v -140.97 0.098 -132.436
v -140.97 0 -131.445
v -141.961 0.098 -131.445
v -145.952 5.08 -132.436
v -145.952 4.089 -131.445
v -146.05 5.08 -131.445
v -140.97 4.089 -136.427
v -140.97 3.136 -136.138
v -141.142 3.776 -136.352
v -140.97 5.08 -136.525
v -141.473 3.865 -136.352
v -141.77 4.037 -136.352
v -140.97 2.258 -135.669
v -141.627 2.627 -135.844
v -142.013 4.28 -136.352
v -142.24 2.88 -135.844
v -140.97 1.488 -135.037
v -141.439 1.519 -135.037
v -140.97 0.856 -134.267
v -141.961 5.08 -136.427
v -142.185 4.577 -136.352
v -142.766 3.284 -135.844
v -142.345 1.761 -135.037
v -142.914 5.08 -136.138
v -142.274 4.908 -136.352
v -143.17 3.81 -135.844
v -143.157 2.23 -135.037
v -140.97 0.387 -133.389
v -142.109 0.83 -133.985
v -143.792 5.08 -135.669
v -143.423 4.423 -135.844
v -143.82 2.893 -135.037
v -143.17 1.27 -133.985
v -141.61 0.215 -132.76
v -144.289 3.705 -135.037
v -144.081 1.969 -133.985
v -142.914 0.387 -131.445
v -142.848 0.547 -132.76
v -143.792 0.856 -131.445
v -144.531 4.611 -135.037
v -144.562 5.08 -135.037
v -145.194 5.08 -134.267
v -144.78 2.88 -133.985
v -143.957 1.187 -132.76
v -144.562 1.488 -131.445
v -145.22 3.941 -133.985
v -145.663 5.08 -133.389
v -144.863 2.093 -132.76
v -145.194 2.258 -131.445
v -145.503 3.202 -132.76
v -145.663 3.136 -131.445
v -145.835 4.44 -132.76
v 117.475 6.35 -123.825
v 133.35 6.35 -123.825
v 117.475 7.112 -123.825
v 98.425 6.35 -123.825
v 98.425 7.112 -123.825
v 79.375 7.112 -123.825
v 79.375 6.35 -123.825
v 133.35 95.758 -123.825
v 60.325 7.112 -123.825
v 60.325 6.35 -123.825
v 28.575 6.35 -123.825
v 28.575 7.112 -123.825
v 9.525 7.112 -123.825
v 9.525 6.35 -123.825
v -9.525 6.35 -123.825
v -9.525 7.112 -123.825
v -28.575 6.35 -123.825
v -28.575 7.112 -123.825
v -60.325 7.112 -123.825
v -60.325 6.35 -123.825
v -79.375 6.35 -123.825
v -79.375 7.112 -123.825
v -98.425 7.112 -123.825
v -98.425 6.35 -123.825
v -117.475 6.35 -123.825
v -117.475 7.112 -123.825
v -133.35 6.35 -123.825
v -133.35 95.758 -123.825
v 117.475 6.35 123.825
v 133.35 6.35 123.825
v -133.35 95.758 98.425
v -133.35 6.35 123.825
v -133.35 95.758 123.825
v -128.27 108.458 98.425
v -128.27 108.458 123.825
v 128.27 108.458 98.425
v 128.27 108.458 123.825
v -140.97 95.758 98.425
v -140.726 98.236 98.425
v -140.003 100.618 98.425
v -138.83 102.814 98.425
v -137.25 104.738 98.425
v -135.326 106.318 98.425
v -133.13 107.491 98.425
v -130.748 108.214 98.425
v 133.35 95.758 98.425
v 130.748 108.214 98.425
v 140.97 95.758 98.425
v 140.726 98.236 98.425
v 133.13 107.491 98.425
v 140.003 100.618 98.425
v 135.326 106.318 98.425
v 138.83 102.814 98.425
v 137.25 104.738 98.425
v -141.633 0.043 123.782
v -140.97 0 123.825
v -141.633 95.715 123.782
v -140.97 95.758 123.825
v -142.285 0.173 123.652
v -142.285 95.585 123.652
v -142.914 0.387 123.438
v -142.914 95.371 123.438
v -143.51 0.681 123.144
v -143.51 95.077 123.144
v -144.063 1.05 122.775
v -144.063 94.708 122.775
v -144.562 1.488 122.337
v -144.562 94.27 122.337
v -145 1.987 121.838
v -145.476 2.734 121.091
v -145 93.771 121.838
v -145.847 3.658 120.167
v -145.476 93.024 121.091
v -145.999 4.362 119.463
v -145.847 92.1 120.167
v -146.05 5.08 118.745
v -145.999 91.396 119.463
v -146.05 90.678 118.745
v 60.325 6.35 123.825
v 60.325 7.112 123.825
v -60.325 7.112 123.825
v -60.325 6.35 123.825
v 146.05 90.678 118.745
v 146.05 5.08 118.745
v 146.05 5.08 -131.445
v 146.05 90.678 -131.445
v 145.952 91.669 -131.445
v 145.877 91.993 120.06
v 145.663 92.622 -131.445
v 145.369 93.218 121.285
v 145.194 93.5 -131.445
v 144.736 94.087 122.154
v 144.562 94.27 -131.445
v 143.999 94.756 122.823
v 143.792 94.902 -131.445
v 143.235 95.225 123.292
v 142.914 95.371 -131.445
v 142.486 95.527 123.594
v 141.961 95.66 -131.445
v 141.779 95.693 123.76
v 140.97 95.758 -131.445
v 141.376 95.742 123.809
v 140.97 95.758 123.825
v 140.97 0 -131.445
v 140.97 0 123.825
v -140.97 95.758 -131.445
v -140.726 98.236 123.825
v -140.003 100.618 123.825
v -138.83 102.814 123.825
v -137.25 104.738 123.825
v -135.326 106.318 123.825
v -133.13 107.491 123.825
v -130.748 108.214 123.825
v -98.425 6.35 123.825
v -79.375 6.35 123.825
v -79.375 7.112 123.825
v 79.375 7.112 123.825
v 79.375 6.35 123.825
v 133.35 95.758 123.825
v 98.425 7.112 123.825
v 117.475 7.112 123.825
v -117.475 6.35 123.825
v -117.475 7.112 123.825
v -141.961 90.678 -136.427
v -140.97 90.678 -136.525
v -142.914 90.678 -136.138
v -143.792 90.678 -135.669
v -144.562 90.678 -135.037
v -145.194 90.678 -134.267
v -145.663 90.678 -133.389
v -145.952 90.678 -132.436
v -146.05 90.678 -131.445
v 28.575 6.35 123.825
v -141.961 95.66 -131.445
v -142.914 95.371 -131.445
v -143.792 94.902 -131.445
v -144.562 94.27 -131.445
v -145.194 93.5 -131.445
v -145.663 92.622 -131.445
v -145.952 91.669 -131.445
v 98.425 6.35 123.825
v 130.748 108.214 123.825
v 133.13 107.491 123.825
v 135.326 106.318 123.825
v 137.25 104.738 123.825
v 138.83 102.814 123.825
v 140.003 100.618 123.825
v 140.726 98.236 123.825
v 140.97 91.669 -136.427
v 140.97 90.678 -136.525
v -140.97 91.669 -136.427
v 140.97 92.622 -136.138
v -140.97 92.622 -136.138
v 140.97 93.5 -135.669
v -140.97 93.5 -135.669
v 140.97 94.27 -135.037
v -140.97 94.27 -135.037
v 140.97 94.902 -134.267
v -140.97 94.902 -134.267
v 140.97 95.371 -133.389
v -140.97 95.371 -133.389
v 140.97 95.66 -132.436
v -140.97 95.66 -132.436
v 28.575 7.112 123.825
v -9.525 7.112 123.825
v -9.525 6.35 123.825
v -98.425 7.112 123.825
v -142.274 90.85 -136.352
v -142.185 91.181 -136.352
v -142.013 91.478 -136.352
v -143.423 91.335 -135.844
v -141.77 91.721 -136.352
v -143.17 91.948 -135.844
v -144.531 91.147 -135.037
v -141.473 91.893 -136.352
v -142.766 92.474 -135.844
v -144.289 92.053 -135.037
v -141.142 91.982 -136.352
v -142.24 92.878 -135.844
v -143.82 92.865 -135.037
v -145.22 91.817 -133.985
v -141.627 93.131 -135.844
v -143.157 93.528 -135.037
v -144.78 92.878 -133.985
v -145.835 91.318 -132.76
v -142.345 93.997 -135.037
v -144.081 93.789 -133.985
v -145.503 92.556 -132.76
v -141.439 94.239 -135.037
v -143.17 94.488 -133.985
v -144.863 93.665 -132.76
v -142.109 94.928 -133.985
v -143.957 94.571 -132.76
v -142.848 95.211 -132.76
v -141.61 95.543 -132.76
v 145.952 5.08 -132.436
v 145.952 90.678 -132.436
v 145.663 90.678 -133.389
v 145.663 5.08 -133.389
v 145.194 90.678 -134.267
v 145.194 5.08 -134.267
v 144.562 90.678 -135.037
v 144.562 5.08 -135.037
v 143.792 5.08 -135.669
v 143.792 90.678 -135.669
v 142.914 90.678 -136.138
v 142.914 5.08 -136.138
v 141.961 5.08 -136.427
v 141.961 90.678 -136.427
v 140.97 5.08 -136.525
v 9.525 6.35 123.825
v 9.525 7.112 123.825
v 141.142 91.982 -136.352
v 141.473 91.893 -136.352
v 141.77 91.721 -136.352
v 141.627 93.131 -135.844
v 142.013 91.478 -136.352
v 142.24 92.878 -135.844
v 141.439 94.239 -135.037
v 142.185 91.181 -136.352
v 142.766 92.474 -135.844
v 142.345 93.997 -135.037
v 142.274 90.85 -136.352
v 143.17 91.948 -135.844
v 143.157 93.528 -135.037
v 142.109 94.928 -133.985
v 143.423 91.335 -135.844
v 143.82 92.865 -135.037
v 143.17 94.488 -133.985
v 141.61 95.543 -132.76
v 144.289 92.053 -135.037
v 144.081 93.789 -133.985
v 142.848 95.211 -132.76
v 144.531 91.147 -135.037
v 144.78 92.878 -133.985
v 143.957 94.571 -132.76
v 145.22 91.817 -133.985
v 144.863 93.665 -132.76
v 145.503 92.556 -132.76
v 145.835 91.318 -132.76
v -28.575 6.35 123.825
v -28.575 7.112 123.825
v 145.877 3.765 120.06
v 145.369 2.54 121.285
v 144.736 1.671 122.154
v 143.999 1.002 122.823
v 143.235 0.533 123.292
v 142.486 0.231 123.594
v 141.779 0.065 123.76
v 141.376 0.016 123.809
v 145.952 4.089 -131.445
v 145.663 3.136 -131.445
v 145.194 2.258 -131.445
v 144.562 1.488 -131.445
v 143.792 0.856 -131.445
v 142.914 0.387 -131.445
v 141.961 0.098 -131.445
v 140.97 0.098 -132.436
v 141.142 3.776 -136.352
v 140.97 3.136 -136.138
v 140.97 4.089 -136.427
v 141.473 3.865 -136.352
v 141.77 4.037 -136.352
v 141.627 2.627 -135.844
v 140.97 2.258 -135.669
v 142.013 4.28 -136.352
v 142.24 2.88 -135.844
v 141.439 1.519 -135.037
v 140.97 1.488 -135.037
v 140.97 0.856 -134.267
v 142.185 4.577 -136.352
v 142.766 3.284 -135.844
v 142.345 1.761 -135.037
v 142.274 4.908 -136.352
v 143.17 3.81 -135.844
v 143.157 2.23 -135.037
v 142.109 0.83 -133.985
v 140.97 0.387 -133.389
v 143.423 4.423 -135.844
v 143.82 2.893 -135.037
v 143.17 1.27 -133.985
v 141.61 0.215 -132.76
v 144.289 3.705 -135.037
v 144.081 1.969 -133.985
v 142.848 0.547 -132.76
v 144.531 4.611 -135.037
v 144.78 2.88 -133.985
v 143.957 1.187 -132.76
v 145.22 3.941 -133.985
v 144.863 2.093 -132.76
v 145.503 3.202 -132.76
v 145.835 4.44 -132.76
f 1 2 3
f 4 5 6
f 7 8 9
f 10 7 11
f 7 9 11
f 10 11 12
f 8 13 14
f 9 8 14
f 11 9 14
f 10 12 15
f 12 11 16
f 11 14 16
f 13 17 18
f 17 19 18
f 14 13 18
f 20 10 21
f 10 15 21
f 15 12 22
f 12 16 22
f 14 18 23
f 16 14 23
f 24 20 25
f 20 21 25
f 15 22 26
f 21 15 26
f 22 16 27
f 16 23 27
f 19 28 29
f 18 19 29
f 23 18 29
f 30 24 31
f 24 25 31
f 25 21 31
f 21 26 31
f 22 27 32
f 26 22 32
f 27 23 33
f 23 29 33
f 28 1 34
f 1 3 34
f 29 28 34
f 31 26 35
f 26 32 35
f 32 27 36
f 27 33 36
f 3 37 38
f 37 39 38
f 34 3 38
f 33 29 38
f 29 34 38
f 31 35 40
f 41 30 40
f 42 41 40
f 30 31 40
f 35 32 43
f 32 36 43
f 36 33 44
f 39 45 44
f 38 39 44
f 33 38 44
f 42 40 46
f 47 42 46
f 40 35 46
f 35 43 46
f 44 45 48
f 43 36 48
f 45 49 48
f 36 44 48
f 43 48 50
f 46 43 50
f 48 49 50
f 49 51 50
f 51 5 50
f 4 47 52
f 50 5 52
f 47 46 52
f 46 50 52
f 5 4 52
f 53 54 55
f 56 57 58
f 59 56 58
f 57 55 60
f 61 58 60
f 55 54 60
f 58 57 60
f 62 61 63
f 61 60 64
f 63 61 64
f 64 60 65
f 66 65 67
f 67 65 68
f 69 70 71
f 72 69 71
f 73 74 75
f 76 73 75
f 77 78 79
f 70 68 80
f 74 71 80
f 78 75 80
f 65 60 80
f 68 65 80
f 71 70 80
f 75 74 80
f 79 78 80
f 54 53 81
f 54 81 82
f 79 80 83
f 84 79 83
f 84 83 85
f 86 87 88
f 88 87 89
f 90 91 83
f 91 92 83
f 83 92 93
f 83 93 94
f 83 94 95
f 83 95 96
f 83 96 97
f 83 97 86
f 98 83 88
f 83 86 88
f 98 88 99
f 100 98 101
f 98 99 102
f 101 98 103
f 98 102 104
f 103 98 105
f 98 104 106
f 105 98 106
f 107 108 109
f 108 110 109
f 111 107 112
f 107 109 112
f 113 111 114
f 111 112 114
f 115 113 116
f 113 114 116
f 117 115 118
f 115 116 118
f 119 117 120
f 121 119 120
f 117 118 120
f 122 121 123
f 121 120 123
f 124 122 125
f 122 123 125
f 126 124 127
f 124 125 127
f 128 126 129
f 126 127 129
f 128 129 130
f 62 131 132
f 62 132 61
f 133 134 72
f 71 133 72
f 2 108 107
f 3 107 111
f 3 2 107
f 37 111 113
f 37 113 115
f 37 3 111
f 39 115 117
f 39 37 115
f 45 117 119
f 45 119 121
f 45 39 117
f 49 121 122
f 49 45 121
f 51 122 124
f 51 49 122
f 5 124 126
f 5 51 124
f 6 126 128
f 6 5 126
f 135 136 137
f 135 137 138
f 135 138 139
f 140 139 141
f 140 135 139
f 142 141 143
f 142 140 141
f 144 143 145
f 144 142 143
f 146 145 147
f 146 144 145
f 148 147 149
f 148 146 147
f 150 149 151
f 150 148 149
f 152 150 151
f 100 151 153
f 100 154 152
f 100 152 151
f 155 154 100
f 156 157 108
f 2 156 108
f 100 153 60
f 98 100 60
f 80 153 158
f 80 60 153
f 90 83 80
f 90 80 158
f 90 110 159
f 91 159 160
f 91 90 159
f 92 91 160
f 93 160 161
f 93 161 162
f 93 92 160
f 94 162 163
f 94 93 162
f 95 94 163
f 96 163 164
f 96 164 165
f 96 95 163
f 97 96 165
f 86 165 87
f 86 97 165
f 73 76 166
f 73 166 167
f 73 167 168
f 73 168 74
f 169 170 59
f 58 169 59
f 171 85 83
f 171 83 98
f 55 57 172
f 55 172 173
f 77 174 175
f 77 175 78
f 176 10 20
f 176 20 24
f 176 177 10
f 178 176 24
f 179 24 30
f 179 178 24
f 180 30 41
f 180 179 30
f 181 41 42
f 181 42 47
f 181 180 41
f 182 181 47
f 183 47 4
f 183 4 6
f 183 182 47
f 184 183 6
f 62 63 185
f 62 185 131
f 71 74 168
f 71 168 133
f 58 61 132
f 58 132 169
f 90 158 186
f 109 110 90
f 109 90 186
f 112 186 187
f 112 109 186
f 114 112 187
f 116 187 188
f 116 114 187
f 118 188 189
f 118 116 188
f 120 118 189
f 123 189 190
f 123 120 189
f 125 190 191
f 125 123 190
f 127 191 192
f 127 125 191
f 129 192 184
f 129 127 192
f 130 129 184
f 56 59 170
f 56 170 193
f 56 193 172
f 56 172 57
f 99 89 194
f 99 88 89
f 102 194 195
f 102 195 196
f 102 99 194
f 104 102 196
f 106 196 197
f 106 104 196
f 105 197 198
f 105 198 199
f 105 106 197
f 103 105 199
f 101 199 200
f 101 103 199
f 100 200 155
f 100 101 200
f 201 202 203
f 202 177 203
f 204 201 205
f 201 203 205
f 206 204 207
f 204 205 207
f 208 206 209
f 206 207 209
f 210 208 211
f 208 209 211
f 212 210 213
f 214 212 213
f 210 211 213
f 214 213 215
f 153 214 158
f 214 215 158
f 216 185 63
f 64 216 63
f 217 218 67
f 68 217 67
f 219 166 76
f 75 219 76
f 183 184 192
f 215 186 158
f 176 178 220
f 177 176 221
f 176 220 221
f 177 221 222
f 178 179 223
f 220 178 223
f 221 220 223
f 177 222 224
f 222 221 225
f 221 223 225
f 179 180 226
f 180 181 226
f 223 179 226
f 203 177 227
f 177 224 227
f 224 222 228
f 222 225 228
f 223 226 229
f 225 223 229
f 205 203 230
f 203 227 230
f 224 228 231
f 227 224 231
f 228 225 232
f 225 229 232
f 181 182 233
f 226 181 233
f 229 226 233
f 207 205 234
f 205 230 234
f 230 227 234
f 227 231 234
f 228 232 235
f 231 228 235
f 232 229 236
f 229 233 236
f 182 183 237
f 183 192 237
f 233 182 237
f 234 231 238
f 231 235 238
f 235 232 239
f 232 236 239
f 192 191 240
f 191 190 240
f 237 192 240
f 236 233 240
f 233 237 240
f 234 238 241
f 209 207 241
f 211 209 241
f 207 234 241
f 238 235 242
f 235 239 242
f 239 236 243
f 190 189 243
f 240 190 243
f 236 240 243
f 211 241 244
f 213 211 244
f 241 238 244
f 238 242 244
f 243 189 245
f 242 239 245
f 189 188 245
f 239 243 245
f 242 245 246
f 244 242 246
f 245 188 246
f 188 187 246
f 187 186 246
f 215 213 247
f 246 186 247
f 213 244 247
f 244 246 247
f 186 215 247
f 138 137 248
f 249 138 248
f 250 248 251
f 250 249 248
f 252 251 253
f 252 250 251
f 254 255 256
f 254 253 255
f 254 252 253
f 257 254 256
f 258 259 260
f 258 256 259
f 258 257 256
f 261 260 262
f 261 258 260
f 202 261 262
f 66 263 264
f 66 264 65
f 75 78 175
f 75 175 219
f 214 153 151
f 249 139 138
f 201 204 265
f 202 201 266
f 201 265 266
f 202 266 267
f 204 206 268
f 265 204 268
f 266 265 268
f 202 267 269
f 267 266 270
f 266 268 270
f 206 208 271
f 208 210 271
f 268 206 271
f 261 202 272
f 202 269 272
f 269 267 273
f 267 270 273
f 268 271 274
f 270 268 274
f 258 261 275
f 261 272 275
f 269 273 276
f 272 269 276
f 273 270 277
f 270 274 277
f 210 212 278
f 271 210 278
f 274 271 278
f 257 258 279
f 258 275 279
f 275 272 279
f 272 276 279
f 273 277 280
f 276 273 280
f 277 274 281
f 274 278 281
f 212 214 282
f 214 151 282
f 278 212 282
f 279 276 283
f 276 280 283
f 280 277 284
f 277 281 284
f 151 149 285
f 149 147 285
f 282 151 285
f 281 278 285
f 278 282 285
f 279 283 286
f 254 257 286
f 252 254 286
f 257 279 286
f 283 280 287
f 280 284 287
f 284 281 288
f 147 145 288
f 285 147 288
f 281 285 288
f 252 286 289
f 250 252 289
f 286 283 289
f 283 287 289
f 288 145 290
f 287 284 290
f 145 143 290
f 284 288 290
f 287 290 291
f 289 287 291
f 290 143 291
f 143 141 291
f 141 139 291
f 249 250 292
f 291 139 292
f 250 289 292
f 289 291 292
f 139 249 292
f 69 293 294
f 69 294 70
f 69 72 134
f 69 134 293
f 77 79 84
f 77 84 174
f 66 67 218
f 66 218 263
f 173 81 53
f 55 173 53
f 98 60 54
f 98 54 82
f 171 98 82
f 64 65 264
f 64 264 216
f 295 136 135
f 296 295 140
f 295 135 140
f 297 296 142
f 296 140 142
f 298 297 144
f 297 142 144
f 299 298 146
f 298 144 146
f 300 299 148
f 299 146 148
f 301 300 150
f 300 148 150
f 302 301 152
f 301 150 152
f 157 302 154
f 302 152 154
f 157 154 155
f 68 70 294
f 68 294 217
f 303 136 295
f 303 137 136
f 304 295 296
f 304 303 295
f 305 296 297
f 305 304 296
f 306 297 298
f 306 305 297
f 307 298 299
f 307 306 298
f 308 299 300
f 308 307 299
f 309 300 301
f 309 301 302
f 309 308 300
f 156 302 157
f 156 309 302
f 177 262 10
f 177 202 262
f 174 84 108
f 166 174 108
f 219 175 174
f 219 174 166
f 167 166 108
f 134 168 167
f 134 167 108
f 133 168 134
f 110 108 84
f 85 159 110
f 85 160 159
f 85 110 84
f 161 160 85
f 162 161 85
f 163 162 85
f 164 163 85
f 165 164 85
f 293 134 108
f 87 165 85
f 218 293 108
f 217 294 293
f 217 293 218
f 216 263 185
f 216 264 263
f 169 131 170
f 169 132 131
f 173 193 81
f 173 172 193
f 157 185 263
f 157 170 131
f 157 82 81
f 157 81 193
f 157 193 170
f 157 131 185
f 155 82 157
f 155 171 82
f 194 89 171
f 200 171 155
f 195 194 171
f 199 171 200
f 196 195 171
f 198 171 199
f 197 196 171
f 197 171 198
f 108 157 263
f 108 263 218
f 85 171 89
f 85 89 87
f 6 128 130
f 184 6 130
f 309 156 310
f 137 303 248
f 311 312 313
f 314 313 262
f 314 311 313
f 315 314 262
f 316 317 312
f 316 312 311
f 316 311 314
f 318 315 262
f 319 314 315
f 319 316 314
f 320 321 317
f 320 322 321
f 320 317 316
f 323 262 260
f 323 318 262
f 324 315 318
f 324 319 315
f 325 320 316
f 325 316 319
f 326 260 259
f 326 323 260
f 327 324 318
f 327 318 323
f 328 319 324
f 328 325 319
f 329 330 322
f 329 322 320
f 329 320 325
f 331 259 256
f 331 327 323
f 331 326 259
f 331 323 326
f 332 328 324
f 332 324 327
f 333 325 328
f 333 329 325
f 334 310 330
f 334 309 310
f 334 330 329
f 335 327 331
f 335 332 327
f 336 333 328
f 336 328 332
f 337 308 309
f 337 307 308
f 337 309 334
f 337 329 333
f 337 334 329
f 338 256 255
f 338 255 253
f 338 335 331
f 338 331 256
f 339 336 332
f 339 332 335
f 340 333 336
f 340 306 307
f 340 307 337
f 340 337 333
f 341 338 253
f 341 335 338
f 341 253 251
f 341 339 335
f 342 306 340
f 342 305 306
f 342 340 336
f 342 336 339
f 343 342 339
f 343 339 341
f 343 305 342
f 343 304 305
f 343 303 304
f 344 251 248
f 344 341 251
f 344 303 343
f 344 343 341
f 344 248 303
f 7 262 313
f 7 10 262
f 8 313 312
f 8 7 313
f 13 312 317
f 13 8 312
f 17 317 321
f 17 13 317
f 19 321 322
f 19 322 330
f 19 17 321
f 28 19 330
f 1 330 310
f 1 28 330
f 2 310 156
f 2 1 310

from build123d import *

# Parameters (mm, degrees)
SKETCH1_W           = 266.7
SKETCH1_H           = 247.65
BOSS_EXTRUDE1_DEPTH = 6.35
SKETCH2_W           = 247.65
SKETCH2_H           = 95.758
BOSS_EXTRUDE2_DEPTH = 12.7
SKETCH3_W           = 292.1
SKETCH3_H           = 95.758
BOSS_EXTRUDE3_DEPTH = 12.7
SKETCH4_W           = 19.05
SKETCH4_H           = 247.65
BOSS_EXTRUDE4_DEPTH = 0.762
FILLET1_R           = 5.08
SKETCH6_W           = 281.94
SKETCH6_H           = 12.7
BOSS_EXTRUDE5_DEPTH = 25.4
FILLET2_R           = 12.7


with BuildPart() as part:
    # Sketch1 → Boss-Extrude1 (new body)
    with BuildSketch(Plane(origin=(0, 0, 0), x_dir=(1, 0, 0), z_dir=(0, 1, 0))):
        Rectangle(SKETCH1_W, SKETCH1_H)
    extrude(amount=BOSS_EXTRUDE1_DEPTH)

    # Sketch2 → Boss-Extrude2 (add)
    with BuildSketch(Plane.ZY.offset(133.35)):
        with Locations((0, 47.879)):
            Rectangle(SKETCH2_W, SKETCH2_H)
    boss_extrude2 = extrude(amount=BOSS_EXTRUDE2_DEPTH)

    # Mirror1: Boss-Extrude2 across plane
    add(boss_extrude2.mirror(Plane(origin=(0, 0, 0), x_dir=(0, 0, 1), z_dir=(1, 0, 0))))

    # Sketch3 → Boss-Extrude3 (add)
    with BuildSketch(Plane(origin=(0, 0, -123.825), x_dir=(-1, 0, 0), z_dir=(0, 0, -1))):
        with Locations((0, 47.879)):
            Rectangle(SKETCH3_W, SKETCH3_H)
    extrude(amount=BOSS_EXTRUDE3_DEPTH)

    # Sketch4 → Boss-Extrude4 (add)
    with BuildSketch(Plane(origin=(0, 6.35, 0), x_dir=(1, 0, 0), z_dir=(0, 1, 0))):
        with Locations((-107.95, 0)):
            Rectangle(SKETCH4_W, SKETCH4_H)
        with Locations((-69.85, 0)):
            Rectangle(SKETCH4_W, SKETCH4_H)
        with Locations((-19.05, 0)):
            Rectangle(SKETCH4_W, SKETCH4_H)
        with Locations((19.05, 0)):
            Rectangle(SKETCH4_W, SKETCH4_H)
        with Locations((69.85, 0)):
            Rectangle(SKETCH4_W, SKETCH4_H)
        with Locations((107.95, 0)):
            Rectangle(SKETCH4_W, SKETCH4_H)
    extrude(amount=BOSS_EXTRUDE4_DEPTH)

    # Fillet1
    fillet1_edges = [part.edges().sort_by_distance(p)[0] for p in [
        (-146.05, 0, -6.35),
        (-146.05, 47.879, 123.825),
        (-146.05, 95.758, -6.35),
        (146.05, 0, -6.35),
        (146.05, 95.758, -6.35),
        (146.05, 47.879, 123.825),
        (0, 0, -136.525),
        (-146.05, 47.879, -136.525),
        (0, 95.758, -136.525),
        (146.05, 47.879, -136.525),
    ]]
    fillet(fillet1_edges, radius=FILLET1_R)

    # Sketch6 → Boss-Extrude5 (add)
    with BuildSketch(Plane.XY.offset(123.825)):
        with Locations((0, 102.108)):
            Rectangle(SKETCH6_W, SKETCH6_H)
    extrude(amount=-BOSS_EXTRUDE5_DEPTH)

    # Fillet2
    fillet2_edges = [part.edges().sort_by_distance(p)[0] for p in [
        (140.97, 108.458, 111.125),
        (-140.97, 108.458, 111.125),
    ]]
    fillet(fillet2_edges, radius=FILLET2_R - 0.0001)  # a hair under: the kernel refuses the full size


solid = part.part
